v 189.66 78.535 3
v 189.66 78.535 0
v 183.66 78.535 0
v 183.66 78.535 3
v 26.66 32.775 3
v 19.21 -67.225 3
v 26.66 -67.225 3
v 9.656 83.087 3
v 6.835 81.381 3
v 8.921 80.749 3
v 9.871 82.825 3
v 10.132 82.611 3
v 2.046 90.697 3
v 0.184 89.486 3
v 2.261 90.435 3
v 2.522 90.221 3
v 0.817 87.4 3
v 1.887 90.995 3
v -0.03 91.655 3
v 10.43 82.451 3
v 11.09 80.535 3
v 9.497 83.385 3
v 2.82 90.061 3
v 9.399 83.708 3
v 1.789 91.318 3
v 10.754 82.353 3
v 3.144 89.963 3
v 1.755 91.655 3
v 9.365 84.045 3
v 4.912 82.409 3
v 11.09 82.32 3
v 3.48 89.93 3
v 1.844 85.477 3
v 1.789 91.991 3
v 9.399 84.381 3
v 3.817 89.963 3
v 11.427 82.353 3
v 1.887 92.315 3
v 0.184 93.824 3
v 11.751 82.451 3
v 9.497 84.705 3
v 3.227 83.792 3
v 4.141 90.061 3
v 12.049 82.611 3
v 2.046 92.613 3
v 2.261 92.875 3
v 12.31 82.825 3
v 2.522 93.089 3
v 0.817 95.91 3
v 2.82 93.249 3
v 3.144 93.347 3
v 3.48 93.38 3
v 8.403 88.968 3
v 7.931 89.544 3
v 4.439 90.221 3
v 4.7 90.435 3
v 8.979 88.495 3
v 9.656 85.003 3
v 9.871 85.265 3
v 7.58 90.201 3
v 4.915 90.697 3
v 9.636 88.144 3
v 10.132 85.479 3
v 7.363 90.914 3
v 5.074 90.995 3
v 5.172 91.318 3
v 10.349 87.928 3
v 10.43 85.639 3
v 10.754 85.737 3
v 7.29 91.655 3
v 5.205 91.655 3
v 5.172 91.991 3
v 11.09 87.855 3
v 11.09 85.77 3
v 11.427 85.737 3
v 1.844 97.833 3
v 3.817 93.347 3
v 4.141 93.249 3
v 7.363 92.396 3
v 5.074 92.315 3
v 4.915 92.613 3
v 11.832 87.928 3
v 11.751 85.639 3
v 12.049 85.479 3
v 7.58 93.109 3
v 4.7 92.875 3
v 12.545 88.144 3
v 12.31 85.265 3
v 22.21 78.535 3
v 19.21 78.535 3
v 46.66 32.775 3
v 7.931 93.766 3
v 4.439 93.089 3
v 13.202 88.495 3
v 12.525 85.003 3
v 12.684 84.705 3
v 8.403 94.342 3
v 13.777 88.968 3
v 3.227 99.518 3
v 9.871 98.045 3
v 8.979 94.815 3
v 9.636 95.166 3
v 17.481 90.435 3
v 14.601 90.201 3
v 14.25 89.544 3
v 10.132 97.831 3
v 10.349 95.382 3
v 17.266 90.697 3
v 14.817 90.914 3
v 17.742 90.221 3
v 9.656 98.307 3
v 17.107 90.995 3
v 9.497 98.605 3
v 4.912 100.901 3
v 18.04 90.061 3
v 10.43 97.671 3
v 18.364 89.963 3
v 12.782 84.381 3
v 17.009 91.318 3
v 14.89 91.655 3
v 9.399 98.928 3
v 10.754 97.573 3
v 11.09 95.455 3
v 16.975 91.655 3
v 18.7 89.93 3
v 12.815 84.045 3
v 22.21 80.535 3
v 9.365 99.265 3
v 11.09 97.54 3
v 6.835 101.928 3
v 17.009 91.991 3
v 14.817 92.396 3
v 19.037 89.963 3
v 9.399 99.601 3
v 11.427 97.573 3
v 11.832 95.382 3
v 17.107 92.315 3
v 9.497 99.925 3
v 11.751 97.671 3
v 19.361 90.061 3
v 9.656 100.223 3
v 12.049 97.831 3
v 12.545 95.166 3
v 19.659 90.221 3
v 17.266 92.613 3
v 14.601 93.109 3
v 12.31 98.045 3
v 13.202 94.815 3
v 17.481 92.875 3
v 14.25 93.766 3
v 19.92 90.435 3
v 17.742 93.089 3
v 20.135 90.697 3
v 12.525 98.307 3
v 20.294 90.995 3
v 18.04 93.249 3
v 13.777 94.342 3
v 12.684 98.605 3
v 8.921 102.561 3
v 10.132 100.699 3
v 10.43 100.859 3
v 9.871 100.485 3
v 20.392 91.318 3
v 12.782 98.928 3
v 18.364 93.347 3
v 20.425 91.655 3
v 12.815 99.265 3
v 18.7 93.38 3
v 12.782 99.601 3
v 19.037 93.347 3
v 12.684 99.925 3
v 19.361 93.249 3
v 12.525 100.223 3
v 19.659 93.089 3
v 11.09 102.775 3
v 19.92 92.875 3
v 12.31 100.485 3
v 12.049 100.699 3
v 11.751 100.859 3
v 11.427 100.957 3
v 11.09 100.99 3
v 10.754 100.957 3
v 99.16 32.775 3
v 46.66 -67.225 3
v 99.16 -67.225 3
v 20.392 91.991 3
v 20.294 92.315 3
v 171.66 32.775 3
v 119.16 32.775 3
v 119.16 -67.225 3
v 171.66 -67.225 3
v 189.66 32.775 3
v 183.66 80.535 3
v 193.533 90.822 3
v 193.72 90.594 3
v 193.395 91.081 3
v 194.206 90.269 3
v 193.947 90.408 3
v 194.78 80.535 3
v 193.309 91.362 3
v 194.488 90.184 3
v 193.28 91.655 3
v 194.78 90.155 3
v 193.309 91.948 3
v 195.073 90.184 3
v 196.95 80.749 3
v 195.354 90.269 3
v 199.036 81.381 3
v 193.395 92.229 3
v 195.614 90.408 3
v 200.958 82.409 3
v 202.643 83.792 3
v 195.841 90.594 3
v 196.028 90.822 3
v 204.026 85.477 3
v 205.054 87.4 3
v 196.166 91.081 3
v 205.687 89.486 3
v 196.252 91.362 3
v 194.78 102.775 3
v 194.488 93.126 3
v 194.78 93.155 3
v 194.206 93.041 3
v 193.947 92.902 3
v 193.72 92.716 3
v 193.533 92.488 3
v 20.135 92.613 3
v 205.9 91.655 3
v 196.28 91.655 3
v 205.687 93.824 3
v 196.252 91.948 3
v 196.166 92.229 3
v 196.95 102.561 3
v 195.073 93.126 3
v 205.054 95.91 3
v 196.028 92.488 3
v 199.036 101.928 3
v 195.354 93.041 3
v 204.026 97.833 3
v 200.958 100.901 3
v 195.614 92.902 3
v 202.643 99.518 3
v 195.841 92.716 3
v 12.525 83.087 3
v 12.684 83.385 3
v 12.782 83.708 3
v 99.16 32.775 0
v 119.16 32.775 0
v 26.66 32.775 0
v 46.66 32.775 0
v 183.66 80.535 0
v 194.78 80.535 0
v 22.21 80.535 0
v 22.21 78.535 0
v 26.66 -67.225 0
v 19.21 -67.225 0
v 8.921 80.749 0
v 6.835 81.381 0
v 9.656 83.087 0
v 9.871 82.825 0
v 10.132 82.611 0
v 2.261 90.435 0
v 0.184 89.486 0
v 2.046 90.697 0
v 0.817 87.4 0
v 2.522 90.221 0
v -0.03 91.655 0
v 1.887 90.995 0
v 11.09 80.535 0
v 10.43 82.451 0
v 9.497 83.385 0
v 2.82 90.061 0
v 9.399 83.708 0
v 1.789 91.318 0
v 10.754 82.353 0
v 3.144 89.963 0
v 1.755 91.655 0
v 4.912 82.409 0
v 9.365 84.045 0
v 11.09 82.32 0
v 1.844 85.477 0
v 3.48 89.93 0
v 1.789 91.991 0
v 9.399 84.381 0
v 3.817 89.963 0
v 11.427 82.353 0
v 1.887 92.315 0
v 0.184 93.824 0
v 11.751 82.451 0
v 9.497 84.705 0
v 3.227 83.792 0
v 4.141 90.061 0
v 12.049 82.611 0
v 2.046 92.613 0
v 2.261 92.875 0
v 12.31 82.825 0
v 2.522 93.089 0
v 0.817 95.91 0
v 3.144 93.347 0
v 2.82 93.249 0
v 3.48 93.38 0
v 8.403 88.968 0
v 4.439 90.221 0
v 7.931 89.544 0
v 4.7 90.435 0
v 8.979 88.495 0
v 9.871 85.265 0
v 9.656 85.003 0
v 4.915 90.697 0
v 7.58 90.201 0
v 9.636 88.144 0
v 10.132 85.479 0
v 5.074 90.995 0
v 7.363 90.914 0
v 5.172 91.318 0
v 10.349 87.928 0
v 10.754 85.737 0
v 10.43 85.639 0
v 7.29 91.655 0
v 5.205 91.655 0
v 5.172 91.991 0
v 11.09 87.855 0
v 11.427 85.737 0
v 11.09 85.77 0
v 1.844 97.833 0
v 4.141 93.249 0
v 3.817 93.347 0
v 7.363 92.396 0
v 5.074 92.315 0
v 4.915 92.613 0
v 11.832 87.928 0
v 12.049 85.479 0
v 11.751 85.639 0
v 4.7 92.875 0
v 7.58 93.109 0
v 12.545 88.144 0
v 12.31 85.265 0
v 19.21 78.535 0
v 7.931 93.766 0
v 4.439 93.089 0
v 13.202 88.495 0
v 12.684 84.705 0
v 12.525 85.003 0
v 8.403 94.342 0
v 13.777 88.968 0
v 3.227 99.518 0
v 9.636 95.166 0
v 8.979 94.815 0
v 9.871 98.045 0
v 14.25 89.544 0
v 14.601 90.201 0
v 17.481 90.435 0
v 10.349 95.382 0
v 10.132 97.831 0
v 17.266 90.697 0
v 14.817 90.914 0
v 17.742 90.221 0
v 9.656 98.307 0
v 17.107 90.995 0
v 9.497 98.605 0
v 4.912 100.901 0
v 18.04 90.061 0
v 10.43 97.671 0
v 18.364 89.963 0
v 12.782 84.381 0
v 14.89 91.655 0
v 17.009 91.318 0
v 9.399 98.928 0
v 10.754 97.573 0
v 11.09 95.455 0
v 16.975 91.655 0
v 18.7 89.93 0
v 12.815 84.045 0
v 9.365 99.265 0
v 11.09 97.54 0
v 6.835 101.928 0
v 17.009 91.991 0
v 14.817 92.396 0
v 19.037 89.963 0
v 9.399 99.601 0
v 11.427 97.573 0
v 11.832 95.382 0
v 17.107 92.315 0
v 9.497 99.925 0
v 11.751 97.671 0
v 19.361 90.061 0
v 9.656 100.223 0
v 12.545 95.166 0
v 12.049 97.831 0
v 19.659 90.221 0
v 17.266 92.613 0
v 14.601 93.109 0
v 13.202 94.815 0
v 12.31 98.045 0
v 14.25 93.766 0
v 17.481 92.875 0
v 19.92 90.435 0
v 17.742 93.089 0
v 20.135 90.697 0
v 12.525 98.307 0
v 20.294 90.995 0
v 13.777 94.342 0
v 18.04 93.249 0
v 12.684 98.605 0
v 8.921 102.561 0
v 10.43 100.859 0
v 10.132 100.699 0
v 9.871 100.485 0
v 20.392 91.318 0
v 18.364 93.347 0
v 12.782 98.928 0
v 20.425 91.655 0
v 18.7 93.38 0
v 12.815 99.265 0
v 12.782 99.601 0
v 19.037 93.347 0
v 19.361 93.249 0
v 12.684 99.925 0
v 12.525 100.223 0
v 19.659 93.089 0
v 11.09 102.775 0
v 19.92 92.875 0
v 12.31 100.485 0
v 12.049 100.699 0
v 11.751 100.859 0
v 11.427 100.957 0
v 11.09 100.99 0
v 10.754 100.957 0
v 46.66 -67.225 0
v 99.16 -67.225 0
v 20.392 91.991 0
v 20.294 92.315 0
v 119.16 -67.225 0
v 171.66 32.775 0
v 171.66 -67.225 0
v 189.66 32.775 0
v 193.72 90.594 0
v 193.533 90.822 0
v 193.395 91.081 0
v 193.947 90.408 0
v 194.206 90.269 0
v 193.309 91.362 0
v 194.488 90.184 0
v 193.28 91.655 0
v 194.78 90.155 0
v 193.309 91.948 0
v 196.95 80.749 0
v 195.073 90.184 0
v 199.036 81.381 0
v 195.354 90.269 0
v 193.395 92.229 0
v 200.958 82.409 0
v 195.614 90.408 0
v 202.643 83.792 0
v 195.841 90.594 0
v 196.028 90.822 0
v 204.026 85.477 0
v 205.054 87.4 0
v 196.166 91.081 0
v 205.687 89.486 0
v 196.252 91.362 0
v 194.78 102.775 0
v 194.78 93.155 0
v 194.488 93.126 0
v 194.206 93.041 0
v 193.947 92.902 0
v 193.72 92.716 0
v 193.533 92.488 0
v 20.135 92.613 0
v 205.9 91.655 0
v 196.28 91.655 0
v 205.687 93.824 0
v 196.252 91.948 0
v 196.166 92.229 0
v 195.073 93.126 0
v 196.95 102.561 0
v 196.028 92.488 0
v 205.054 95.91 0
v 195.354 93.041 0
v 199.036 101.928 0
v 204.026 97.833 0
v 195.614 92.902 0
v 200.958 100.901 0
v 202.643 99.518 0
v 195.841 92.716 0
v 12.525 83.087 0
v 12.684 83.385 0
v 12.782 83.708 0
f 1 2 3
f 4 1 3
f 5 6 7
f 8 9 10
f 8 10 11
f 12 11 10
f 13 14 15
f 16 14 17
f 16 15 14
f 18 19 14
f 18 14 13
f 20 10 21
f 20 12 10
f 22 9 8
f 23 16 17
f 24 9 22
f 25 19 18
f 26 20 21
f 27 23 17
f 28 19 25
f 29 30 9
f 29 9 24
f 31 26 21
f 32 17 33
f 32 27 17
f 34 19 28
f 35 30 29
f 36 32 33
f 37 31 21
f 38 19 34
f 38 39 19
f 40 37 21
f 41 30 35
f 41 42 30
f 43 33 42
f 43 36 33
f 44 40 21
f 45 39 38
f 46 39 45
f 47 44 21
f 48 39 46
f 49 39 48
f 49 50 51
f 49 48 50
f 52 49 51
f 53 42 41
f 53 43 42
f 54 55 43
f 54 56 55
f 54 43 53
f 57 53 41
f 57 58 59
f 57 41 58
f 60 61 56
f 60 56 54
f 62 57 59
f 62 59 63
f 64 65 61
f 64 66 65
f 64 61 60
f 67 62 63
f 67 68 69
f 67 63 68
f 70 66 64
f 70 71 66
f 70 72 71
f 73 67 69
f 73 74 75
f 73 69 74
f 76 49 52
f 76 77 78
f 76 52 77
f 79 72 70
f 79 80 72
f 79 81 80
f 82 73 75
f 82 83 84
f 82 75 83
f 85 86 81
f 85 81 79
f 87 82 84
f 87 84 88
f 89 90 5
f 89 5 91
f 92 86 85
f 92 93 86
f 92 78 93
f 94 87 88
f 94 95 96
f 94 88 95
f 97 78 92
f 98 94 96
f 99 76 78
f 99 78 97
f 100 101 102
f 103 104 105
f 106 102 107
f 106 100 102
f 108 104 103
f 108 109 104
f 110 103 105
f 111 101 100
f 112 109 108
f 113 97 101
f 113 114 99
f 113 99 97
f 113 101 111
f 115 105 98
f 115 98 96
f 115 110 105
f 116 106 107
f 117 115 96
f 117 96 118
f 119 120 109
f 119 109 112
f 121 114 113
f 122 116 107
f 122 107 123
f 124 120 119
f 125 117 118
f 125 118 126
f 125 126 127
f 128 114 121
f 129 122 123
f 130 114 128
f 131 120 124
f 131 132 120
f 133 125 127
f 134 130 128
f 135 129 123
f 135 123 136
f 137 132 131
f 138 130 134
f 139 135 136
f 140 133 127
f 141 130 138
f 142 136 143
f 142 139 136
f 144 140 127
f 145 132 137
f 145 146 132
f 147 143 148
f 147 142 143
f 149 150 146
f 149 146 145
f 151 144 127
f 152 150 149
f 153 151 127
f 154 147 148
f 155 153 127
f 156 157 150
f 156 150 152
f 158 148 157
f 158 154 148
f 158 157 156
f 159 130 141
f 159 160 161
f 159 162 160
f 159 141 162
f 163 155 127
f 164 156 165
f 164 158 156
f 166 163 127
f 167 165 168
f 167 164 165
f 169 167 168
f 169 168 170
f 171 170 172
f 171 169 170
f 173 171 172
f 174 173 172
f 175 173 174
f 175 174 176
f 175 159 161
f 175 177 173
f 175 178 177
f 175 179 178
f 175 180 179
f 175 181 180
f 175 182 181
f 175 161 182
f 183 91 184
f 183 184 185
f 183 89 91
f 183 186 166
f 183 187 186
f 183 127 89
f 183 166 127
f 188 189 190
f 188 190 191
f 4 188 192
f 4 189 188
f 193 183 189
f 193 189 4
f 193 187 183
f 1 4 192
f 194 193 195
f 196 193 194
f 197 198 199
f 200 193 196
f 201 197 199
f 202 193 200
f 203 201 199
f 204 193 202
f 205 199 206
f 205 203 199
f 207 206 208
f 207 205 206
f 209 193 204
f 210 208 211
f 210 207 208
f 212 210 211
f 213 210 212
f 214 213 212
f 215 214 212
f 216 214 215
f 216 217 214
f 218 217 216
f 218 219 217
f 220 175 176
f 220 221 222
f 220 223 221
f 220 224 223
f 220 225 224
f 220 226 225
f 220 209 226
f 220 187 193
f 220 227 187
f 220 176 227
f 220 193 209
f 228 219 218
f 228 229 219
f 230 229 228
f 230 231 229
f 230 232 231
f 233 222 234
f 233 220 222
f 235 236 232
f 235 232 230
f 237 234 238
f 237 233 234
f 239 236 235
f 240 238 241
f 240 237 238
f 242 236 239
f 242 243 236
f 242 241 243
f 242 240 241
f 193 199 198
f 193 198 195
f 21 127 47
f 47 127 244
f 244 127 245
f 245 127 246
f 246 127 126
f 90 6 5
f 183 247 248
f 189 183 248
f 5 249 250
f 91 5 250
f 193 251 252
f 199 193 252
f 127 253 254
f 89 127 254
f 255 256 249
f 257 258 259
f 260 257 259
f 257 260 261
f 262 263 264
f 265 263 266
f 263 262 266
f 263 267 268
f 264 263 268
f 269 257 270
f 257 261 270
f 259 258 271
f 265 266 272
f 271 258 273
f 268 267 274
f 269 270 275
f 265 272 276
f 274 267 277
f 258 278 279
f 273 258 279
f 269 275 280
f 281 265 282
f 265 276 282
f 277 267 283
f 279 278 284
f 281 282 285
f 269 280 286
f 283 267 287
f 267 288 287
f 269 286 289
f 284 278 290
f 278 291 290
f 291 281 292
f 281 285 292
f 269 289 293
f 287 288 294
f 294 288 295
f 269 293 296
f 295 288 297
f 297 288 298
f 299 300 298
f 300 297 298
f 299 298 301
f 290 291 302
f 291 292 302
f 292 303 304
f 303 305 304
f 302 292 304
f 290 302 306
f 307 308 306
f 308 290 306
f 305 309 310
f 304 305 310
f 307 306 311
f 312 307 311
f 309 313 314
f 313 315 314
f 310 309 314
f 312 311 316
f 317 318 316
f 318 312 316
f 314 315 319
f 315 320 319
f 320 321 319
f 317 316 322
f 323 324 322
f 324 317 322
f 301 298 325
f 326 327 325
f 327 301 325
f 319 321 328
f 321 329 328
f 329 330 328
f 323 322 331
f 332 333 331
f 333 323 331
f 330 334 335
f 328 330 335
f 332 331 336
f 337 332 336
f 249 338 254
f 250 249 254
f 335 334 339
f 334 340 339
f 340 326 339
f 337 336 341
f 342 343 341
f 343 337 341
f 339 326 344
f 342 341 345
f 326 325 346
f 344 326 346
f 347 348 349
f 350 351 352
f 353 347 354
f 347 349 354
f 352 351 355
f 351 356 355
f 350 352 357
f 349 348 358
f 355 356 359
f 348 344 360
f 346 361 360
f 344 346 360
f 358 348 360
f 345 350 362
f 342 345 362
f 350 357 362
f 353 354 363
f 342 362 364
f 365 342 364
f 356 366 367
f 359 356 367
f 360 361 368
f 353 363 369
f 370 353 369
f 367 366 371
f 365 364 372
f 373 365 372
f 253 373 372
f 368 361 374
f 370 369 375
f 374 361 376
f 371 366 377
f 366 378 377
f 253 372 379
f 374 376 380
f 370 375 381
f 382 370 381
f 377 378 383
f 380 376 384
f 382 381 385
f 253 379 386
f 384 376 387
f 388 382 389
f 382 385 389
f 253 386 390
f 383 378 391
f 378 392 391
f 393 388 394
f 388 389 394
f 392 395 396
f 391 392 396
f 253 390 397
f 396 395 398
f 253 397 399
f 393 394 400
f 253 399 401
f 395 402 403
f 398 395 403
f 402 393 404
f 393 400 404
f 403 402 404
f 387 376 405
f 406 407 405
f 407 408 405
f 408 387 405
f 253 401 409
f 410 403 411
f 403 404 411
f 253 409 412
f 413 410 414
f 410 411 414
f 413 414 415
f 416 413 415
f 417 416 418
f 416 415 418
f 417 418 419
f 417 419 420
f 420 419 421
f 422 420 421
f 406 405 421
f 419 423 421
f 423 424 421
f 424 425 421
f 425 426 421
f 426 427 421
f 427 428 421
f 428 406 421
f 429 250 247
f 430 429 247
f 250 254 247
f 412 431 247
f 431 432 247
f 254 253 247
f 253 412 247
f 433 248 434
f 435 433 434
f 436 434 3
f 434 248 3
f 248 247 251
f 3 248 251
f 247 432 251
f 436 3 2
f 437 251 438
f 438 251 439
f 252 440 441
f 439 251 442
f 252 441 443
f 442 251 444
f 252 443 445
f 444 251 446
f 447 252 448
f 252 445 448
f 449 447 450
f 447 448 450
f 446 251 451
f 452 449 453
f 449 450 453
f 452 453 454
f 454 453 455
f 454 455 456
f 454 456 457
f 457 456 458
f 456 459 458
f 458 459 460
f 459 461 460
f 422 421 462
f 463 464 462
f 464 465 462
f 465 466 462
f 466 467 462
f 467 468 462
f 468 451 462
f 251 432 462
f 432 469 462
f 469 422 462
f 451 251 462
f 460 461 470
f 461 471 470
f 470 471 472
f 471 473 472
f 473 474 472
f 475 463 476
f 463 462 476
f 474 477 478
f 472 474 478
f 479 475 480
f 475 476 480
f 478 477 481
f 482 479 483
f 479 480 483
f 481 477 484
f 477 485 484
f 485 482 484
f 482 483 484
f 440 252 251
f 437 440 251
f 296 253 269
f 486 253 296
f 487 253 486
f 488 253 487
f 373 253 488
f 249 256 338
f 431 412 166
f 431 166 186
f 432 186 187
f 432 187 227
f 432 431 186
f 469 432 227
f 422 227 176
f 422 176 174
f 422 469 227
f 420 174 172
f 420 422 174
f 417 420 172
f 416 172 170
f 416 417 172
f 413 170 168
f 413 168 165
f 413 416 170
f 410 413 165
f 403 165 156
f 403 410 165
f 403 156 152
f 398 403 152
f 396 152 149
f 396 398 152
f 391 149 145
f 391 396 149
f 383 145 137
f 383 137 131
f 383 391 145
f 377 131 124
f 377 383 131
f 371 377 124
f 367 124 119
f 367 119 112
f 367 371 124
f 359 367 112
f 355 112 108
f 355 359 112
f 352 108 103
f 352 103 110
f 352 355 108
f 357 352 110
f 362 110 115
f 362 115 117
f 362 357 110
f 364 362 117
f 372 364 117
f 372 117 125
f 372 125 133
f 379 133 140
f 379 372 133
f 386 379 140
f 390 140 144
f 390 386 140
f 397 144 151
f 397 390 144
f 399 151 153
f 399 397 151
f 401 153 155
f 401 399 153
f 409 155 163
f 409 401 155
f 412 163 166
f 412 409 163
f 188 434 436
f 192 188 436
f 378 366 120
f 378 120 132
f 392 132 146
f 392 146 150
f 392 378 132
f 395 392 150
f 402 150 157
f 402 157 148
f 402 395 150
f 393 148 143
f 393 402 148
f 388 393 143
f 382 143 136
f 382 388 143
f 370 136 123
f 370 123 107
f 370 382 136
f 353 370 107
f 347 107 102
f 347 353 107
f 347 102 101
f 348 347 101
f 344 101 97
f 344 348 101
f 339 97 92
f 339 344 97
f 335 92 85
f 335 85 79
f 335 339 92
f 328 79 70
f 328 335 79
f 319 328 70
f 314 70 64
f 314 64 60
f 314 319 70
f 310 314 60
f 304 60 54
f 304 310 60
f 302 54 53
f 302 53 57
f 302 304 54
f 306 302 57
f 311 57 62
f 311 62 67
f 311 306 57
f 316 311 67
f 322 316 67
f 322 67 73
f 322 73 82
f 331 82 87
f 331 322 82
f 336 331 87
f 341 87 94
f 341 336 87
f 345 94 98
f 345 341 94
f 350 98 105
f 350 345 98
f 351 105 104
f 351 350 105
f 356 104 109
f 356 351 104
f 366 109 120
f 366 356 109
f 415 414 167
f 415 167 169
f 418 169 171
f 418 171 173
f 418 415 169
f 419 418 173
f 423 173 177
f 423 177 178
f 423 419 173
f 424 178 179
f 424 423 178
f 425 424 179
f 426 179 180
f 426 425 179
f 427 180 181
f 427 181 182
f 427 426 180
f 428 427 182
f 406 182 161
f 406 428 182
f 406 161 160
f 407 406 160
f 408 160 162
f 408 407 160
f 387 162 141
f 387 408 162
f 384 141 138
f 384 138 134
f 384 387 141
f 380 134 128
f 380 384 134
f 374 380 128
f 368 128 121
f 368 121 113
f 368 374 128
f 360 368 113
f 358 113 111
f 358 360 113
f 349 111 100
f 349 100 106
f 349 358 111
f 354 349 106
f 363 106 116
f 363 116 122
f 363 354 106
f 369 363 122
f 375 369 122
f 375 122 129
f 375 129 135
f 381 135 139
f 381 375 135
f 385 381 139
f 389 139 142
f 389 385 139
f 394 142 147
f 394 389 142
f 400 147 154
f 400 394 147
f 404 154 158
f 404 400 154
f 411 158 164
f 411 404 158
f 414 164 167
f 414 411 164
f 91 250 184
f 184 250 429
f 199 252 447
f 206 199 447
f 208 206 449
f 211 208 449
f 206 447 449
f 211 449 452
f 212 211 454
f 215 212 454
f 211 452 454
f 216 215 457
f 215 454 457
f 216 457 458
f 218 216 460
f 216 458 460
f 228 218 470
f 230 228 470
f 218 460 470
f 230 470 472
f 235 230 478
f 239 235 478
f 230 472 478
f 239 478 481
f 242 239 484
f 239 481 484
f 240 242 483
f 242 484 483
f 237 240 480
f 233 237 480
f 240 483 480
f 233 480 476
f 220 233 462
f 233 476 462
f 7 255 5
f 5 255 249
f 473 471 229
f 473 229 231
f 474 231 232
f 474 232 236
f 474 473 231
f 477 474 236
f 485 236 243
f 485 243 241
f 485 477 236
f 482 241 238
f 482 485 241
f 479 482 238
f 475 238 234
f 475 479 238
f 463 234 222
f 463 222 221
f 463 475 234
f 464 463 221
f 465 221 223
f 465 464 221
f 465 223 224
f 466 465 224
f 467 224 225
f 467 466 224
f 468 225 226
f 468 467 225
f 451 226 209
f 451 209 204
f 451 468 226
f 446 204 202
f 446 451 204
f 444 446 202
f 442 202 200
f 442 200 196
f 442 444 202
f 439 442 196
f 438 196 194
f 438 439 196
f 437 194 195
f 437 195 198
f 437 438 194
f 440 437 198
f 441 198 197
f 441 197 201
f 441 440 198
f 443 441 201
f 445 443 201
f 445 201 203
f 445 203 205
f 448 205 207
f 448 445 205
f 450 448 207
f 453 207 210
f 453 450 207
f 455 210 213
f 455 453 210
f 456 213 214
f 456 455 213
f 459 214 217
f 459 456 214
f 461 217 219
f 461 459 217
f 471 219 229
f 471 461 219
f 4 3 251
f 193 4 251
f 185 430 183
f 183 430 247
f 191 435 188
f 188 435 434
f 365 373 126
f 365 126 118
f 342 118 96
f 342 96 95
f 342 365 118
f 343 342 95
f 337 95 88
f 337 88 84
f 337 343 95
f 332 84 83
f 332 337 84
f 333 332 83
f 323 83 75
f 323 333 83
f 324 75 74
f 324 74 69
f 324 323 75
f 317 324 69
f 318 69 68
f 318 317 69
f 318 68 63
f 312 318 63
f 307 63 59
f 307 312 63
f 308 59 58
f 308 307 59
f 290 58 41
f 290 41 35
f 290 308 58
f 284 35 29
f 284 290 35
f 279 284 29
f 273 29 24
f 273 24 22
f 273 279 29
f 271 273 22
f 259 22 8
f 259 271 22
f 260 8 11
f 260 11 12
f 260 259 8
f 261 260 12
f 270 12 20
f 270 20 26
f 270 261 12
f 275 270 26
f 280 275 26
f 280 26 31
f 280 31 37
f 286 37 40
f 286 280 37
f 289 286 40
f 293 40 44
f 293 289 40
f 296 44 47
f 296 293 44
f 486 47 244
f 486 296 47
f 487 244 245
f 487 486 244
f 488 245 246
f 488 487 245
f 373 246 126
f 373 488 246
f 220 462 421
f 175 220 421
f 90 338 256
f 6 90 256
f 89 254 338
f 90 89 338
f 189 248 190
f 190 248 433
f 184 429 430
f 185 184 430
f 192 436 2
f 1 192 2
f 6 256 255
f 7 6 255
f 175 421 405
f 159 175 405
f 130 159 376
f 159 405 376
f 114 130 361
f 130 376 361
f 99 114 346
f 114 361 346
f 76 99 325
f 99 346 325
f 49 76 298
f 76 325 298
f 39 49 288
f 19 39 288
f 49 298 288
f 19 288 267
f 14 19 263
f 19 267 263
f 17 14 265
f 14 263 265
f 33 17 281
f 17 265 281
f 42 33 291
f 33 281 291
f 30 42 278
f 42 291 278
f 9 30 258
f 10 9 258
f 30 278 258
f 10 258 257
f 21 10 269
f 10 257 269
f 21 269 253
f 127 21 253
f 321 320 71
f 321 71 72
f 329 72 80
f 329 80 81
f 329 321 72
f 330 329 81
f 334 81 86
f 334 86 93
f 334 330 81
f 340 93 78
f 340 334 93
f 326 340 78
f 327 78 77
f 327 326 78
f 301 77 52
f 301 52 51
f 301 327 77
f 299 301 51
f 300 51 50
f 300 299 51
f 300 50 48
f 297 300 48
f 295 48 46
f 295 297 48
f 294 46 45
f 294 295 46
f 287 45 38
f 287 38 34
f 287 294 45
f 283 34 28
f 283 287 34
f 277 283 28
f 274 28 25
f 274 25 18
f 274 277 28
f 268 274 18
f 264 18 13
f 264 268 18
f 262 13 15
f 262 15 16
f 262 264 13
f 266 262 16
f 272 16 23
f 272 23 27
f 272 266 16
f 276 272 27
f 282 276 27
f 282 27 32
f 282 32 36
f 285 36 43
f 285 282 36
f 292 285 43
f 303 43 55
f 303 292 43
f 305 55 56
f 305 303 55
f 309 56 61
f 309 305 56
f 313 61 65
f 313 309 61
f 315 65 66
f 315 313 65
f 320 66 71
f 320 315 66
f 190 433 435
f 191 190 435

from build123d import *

# Parameters (mm, degrees)
ESQUISSE1_R        = 1.5
ESQUISSE1_R_2      = 3.8
ESQUISSE1_R_3      = 1.725
BOSS_EXTRU_1_DEPTH = 3


with BuildPart() as part:
    # Esquisse1 → Boss.-Extru.1 (new body)
    with BuildSketch(Plane.XY):
        with BuildLine():
            Line((19.21041076, -67.22505422), (26.66041076, -67.22505422))
            Line((26.66041076, -67.22505422), (26.66041076, 32.77494578))
            Line((26.66041076, 32.77494578), (46.66041076, 32.77494578))
            Line((46.66041076, 32.77494578), (46.66041076, -67.22505422))
            Line((46.66041076, -67.22505422), (99.16041076, -67.22505422))
            Line((99.16041076, -67.22505422), (99.16041076, 32.77494578))
            Line((99.16041076, 32.77494578), (119.16041076, 32.77494578))
            Line((119.16041076, 32.77494578), (119.16041076, -67.22505422))
            Line((119.16041076, -67.22505422), (171.66041076, -67.22505422))
            Line((171.66041076, -67.22505422), (171.66041076, 32.77494578))
            Line((171.66041076, 32.77494578), (189.66041076, 32.77494578))
            Line((189.66041076, 32.77494578), (189.66041076, 78.53494578))
            Line((189.66041076, 78.53494578), (183.66041076, 78.53494578))
            Line((183.66041076, 78.53494578), (183.66041076, 80.53494578))
            Line((183.66041076, 80.53494578), (194.78041076, 80.53494578))
            ThreePointArc((194.78041076, 80.53494578), (205.90041076, 91.65494578), (194.78041076, 102.77494578))
            Line((194.78041076, 102.77494578), (11.09041076, 102.77494578))
            ThreePointArc((11.09041076, 102.77494578), (-0.02958924, 91.65494578), (11.09041076, 80.53494578))
            Line((11.09041076, 80.53494578), (22.21041076, 80.53494578))
            Line((22.21041076, 80.53494578), (22.21041076, 78.53494578))
            Line((22.21041076, 78.53494578), (19.21041076, 78.53494578))
            Line((19.21041076, 78.53494578), (19.21041076, -67.22505422))
        make_face()
        with Locations((194.78041076, 91.65494578)):
            Circle(ESQUISSE1_R, mode=Mode.SUBTRACT)
        with Locations((11.09041076, 91.65494578)):
            Circle(ESQUISSE1_R_2, mode=Mode.SUBTRACT)
        with Locations((11.09041076, 99.26494578)):
            Circle(ESQUISSE1_R_3, mode=Mode.SUBTRACT)
        with Locations((18.70041076, 91.65494578)):
            Circle(ESQUISSE1_R_3, mode=Mode.SUBTRACT)
        with Locations((11.09041076, 84.04494578)):
            Circle(ESQUISSE1_R_3, mode=Mode.SUBTRACT)
        with Locations((3.48041076, 91.65494578)):
            Circle(ESQUISSE1_R_3, mode=Mode.SUBTRACT)
    extrude(amount=BOSS_EXTRU_1_DEPTH)


solid = part.part
